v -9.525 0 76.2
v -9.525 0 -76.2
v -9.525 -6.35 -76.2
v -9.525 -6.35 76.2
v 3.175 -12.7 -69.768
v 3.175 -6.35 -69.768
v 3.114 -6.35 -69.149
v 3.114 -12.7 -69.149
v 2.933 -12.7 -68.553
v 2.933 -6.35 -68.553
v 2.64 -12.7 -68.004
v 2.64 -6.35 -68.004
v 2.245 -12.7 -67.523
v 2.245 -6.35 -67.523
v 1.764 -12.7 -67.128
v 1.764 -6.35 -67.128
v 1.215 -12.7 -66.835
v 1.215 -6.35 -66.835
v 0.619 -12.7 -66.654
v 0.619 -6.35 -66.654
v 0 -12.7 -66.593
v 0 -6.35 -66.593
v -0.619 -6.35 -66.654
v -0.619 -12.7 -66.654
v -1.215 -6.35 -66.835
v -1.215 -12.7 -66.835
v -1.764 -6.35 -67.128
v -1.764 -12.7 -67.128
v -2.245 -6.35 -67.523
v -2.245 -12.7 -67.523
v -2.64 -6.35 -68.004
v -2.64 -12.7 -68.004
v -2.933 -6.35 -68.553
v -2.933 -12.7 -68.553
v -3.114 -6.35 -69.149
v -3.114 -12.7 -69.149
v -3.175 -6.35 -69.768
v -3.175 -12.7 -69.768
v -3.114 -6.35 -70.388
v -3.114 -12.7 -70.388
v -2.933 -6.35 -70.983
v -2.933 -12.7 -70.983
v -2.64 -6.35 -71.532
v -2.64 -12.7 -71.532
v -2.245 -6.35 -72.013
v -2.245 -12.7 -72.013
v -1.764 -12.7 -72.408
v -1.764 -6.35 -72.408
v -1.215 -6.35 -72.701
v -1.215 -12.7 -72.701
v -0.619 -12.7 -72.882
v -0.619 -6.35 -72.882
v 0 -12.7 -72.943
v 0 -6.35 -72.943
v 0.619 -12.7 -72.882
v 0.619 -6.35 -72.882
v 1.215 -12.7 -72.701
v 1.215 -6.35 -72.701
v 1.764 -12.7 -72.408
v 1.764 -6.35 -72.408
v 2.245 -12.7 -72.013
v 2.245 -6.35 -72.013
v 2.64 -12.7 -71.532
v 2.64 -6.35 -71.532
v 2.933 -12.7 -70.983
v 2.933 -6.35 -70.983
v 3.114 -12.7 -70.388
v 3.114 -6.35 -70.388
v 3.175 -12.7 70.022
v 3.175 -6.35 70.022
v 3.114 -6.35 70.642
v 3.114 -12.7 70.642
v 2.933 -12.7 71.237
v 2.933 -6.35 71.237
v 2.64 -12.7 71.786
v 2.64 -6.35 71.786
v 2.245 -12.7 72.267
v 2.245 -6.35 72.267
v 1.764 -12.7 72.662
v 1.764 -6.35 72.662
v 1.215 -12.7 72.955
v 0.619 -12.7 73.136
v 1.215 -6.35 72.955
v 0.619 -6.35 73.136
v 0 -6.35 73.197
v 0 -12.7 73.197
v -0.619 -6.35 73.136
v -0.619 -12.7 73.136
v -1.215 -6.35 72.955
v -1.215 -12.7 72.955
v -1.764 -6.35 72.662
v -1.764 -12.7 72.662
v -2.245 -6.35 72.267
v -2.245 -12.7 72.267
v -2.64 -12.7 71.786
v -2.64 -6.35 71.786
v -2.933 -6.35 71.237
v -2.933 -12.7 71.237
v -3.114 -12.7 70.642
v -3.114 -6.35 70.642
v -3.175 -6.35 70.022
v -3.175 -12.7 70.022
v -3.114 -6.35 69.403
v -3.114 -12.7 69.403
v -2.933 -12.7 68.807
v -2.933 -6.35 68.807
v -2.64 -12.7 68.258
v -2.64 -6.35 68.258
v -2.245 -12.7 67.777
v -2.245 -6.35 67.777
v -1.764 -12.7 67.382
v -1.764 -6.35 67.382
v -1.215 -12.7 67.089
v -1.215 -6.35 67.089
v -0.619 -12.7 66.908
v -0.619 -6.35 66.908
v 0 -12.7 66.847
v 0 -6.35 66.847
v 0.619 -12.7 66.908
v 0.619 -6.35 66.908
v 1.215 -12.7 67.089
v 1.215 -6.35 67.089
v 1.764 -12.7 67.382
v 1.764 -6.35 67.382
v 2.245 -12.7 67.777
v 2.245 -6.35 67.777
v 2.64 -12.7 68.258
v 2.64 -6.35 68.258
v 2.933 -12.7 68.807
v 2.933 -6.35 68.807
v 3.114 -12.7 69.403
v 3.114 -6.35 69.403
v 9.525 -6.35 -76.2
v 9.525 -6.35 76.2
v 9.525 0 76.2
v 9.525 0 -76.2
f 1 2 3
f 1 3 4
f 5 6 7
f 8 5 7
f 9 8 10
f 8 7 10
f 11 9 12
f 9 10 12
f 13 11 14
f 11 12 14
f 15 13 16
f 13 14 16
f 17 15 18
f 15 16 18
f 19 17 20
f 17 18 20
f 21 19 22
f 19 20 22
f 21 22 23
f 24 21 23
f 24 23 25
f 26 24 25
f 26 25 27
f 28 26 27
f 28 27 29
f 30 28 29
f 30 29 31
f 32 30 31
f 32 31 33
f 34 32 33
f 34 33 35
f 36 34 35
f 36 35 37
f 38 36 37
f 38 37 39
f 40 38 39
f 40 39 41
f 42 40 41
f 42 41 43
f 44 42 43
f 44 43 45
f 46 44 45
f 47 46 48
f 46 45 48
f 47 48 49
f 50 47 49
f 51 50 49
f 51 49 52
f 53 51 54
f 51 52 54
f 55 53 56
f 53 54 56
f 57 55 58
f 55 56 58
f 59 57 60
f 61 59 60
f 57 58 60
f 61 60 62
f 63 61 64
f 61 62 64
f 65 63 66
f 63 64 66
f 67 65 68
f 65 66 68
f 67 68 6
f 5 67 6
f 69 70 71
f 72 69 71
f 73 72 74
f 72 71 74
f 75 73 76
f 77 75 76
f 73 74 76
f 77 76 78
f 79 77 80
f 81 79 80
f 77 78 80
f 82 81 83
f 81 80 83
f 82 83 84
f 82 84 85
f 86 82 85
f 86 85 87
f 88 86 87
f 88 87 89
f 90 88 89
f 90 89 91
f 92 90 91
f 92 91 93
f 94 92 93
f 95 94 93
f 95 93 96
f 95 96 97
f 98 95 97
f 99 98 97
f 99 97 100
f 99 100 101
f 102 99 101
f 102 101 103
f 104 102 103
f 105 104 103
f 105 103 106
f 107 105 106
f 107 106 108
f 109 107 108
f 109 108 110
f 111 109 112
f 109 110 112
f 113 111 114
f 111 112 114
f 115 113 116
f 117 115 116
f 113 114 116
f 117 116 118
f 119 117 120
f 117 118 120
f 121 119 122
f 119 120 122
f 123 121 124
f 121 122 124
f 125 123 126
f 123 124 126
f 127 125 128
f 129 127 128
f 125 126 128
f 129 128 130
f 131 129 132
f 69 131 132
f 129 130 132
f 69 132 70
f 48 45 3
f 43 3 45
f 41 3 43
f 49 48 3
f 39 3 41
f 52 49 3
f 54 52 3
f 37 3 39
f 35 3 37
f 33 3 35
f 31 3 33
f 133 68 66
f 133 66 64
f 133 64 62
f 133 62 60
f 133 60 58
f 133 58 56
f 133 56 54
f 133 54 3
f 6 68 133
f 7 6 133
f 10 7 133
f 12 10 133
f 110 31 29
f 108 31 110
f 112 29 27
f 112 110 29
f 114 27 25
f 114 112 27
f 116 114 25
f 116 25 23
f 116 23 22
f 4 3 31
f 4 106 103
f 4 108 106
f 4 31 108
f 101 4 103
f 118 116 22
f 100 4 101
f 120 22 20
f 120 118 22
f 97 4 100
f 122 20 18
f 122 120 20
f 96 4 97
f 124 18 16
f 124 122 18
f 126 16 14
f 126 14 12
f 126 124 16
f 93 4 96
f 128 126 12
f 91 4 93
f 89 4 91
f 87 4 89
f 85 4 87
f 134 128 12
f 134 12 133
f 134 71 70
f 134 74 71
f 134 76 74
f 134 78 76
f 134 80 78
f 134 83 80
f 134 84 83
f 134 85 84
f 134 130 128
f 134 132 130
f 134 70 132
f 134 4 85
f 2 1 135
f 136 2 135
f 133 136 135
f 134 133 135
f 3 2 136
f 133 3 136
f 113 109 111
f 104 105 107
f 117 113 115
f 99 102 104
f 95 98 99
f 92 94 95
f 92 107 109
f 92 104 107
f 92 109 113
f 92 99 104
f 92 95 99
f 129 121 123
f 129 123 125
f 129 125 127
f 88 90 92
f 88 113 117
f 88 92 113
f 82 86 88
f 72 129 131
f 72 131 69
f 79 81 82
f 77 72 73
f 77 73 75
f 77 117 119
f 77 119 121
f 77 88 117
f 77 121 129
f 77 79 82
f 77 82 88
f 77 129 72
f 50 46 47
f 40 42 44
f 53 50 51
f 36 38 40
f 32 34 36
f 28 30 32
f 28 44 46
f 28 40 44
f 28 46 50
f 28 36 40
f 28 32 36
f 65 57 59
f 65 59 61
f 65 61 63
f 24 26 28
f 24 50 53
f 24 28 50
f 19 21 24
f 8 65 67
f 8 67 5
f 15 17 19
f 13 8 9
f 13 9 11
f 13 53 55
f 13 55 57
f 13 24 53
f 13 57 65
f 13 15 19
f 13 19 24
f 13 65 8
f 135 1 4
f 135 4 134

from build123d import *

# Parameters (mm, degrees)
F0_R     = 3.175
F0_W     = 19.05
F0_H     = 152.4
F1_DEPTH = 6.35
F2_DEPTH = 12.7


with BuildPart() as f1:
    # F0 (on Front) → F1 (new body)
    with BuildSketch(Plane.XZ):
        with Locations((0, 70.022136)):
            Circle(F0_R)
        Rectangle(F0_W, F0_H)
        with Locations((0, -69.768146)):
            Circle(F0_R, mode=Mode.SUBTRACT)
        with Locations((0, 70.022136)):
            Circle(F0_R, mode=Mode.SUBTRACT)
        with Locations((0, -69.768146)):
            Circle(F0_R)
    extrude(amount=F1_DEPTH)

    # F0 (on Front) → F2 (join)
    with BuildSketch(Plane.XZ):
        with Locations((0, 70.022136)):
            Circle(F0_R)
        with Locations((0, -69.768146)):
            Circle(F0_R)
    extrude(amount=F2_DEPTH)


solid = f1.part
